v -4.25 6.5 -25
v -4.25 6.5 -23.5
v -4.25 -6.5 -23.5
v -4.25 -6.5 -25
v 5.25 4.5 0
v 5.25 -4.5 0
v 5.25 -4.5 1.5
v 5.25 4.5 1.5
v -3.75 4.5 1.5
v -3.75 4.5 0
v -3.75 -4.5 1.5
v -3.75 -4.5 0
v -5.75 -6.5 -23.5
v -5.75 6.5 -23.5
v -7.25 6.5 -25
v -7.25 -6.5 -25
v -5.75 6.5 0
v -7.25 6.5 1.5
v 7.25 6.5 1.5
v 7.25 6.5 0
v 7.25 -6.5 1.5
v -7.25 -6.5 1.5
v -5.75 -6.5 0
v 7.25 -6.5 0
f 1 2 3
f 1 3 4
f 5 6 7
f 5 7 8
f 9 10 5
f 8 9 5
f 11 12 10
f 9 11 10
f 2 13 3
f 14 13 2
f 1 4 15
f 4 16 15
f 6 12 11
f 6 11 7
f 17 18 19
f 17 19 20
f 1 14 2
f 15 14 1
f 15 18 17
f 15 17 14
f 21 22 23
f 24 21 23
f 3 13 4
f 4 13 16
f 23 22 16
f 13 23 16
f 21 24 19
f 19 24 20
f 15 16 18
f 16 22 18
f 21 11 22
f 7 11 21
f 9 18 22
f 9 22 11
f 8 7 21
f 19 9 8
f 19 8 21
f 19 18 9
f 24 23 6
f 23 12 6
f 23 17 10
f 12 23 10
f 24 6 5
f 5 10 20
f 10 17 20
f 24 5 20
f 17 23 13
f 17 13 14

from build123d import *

# Parameters (mm, degrees)
SKETCH1_W           = 14.5
SKETCH1_H           = 13
SKETCH1_W_2         = 9
SKETCH1_H_2         = 9
BOSS_EXTRUDE1_DEPTH = 1.5
SKETCH2_W           = 1.5
SKETCH2_H           = 13
BOSS_EXTRUDE2_DEPTH = 25
SKETCH3_W           = 1.5
SKETCH3_H           = 13
BOSS_EXTRUDE3_DEPTH = 1.5


with BuildPart() as part:
    # Sketch1 → Boss-Extrude1 (new body)
    with BuildSketch(Plane.XY):
        Rectangle(SKETCH1_W, SKETCH1_H)
        with Locations((0.75, 0)):
            Rectangle(SKETCH1_W_2, SKETCH1_H_2, mode=Mode.SUBTRACT)
    extrude(amount=BOSS_EXTRUDE1_DEPTH)

    # Sketch2 → Boss-Extrude2 (add)
    with BuildSketch(Plane(origin=(0, 0, 0), x_dir=(-1, 0, 0), z_dir=(0, 0, -1))):
        with Locations((6.5, 0)):
            Rectangle(SKETCH2_W, SKETCH2_H)
    extrude(amount=BOSS_EXTRUDE2_DEPTH)

    # Sketch3 → Boss-Extrude3 (add)
    with BuildSketch(Plane(origin=(-5.75, 0, 0), x_dir=(0, 0, -1), z_dir=(1, 0, 0))):
        with Locations((24.25, 0)):
            Rectangle(SKETCH3_W, SKETCH3_H)
    extrude(amount=BOSS_EXTRUDE3_DEPTH)


solid = part.part
